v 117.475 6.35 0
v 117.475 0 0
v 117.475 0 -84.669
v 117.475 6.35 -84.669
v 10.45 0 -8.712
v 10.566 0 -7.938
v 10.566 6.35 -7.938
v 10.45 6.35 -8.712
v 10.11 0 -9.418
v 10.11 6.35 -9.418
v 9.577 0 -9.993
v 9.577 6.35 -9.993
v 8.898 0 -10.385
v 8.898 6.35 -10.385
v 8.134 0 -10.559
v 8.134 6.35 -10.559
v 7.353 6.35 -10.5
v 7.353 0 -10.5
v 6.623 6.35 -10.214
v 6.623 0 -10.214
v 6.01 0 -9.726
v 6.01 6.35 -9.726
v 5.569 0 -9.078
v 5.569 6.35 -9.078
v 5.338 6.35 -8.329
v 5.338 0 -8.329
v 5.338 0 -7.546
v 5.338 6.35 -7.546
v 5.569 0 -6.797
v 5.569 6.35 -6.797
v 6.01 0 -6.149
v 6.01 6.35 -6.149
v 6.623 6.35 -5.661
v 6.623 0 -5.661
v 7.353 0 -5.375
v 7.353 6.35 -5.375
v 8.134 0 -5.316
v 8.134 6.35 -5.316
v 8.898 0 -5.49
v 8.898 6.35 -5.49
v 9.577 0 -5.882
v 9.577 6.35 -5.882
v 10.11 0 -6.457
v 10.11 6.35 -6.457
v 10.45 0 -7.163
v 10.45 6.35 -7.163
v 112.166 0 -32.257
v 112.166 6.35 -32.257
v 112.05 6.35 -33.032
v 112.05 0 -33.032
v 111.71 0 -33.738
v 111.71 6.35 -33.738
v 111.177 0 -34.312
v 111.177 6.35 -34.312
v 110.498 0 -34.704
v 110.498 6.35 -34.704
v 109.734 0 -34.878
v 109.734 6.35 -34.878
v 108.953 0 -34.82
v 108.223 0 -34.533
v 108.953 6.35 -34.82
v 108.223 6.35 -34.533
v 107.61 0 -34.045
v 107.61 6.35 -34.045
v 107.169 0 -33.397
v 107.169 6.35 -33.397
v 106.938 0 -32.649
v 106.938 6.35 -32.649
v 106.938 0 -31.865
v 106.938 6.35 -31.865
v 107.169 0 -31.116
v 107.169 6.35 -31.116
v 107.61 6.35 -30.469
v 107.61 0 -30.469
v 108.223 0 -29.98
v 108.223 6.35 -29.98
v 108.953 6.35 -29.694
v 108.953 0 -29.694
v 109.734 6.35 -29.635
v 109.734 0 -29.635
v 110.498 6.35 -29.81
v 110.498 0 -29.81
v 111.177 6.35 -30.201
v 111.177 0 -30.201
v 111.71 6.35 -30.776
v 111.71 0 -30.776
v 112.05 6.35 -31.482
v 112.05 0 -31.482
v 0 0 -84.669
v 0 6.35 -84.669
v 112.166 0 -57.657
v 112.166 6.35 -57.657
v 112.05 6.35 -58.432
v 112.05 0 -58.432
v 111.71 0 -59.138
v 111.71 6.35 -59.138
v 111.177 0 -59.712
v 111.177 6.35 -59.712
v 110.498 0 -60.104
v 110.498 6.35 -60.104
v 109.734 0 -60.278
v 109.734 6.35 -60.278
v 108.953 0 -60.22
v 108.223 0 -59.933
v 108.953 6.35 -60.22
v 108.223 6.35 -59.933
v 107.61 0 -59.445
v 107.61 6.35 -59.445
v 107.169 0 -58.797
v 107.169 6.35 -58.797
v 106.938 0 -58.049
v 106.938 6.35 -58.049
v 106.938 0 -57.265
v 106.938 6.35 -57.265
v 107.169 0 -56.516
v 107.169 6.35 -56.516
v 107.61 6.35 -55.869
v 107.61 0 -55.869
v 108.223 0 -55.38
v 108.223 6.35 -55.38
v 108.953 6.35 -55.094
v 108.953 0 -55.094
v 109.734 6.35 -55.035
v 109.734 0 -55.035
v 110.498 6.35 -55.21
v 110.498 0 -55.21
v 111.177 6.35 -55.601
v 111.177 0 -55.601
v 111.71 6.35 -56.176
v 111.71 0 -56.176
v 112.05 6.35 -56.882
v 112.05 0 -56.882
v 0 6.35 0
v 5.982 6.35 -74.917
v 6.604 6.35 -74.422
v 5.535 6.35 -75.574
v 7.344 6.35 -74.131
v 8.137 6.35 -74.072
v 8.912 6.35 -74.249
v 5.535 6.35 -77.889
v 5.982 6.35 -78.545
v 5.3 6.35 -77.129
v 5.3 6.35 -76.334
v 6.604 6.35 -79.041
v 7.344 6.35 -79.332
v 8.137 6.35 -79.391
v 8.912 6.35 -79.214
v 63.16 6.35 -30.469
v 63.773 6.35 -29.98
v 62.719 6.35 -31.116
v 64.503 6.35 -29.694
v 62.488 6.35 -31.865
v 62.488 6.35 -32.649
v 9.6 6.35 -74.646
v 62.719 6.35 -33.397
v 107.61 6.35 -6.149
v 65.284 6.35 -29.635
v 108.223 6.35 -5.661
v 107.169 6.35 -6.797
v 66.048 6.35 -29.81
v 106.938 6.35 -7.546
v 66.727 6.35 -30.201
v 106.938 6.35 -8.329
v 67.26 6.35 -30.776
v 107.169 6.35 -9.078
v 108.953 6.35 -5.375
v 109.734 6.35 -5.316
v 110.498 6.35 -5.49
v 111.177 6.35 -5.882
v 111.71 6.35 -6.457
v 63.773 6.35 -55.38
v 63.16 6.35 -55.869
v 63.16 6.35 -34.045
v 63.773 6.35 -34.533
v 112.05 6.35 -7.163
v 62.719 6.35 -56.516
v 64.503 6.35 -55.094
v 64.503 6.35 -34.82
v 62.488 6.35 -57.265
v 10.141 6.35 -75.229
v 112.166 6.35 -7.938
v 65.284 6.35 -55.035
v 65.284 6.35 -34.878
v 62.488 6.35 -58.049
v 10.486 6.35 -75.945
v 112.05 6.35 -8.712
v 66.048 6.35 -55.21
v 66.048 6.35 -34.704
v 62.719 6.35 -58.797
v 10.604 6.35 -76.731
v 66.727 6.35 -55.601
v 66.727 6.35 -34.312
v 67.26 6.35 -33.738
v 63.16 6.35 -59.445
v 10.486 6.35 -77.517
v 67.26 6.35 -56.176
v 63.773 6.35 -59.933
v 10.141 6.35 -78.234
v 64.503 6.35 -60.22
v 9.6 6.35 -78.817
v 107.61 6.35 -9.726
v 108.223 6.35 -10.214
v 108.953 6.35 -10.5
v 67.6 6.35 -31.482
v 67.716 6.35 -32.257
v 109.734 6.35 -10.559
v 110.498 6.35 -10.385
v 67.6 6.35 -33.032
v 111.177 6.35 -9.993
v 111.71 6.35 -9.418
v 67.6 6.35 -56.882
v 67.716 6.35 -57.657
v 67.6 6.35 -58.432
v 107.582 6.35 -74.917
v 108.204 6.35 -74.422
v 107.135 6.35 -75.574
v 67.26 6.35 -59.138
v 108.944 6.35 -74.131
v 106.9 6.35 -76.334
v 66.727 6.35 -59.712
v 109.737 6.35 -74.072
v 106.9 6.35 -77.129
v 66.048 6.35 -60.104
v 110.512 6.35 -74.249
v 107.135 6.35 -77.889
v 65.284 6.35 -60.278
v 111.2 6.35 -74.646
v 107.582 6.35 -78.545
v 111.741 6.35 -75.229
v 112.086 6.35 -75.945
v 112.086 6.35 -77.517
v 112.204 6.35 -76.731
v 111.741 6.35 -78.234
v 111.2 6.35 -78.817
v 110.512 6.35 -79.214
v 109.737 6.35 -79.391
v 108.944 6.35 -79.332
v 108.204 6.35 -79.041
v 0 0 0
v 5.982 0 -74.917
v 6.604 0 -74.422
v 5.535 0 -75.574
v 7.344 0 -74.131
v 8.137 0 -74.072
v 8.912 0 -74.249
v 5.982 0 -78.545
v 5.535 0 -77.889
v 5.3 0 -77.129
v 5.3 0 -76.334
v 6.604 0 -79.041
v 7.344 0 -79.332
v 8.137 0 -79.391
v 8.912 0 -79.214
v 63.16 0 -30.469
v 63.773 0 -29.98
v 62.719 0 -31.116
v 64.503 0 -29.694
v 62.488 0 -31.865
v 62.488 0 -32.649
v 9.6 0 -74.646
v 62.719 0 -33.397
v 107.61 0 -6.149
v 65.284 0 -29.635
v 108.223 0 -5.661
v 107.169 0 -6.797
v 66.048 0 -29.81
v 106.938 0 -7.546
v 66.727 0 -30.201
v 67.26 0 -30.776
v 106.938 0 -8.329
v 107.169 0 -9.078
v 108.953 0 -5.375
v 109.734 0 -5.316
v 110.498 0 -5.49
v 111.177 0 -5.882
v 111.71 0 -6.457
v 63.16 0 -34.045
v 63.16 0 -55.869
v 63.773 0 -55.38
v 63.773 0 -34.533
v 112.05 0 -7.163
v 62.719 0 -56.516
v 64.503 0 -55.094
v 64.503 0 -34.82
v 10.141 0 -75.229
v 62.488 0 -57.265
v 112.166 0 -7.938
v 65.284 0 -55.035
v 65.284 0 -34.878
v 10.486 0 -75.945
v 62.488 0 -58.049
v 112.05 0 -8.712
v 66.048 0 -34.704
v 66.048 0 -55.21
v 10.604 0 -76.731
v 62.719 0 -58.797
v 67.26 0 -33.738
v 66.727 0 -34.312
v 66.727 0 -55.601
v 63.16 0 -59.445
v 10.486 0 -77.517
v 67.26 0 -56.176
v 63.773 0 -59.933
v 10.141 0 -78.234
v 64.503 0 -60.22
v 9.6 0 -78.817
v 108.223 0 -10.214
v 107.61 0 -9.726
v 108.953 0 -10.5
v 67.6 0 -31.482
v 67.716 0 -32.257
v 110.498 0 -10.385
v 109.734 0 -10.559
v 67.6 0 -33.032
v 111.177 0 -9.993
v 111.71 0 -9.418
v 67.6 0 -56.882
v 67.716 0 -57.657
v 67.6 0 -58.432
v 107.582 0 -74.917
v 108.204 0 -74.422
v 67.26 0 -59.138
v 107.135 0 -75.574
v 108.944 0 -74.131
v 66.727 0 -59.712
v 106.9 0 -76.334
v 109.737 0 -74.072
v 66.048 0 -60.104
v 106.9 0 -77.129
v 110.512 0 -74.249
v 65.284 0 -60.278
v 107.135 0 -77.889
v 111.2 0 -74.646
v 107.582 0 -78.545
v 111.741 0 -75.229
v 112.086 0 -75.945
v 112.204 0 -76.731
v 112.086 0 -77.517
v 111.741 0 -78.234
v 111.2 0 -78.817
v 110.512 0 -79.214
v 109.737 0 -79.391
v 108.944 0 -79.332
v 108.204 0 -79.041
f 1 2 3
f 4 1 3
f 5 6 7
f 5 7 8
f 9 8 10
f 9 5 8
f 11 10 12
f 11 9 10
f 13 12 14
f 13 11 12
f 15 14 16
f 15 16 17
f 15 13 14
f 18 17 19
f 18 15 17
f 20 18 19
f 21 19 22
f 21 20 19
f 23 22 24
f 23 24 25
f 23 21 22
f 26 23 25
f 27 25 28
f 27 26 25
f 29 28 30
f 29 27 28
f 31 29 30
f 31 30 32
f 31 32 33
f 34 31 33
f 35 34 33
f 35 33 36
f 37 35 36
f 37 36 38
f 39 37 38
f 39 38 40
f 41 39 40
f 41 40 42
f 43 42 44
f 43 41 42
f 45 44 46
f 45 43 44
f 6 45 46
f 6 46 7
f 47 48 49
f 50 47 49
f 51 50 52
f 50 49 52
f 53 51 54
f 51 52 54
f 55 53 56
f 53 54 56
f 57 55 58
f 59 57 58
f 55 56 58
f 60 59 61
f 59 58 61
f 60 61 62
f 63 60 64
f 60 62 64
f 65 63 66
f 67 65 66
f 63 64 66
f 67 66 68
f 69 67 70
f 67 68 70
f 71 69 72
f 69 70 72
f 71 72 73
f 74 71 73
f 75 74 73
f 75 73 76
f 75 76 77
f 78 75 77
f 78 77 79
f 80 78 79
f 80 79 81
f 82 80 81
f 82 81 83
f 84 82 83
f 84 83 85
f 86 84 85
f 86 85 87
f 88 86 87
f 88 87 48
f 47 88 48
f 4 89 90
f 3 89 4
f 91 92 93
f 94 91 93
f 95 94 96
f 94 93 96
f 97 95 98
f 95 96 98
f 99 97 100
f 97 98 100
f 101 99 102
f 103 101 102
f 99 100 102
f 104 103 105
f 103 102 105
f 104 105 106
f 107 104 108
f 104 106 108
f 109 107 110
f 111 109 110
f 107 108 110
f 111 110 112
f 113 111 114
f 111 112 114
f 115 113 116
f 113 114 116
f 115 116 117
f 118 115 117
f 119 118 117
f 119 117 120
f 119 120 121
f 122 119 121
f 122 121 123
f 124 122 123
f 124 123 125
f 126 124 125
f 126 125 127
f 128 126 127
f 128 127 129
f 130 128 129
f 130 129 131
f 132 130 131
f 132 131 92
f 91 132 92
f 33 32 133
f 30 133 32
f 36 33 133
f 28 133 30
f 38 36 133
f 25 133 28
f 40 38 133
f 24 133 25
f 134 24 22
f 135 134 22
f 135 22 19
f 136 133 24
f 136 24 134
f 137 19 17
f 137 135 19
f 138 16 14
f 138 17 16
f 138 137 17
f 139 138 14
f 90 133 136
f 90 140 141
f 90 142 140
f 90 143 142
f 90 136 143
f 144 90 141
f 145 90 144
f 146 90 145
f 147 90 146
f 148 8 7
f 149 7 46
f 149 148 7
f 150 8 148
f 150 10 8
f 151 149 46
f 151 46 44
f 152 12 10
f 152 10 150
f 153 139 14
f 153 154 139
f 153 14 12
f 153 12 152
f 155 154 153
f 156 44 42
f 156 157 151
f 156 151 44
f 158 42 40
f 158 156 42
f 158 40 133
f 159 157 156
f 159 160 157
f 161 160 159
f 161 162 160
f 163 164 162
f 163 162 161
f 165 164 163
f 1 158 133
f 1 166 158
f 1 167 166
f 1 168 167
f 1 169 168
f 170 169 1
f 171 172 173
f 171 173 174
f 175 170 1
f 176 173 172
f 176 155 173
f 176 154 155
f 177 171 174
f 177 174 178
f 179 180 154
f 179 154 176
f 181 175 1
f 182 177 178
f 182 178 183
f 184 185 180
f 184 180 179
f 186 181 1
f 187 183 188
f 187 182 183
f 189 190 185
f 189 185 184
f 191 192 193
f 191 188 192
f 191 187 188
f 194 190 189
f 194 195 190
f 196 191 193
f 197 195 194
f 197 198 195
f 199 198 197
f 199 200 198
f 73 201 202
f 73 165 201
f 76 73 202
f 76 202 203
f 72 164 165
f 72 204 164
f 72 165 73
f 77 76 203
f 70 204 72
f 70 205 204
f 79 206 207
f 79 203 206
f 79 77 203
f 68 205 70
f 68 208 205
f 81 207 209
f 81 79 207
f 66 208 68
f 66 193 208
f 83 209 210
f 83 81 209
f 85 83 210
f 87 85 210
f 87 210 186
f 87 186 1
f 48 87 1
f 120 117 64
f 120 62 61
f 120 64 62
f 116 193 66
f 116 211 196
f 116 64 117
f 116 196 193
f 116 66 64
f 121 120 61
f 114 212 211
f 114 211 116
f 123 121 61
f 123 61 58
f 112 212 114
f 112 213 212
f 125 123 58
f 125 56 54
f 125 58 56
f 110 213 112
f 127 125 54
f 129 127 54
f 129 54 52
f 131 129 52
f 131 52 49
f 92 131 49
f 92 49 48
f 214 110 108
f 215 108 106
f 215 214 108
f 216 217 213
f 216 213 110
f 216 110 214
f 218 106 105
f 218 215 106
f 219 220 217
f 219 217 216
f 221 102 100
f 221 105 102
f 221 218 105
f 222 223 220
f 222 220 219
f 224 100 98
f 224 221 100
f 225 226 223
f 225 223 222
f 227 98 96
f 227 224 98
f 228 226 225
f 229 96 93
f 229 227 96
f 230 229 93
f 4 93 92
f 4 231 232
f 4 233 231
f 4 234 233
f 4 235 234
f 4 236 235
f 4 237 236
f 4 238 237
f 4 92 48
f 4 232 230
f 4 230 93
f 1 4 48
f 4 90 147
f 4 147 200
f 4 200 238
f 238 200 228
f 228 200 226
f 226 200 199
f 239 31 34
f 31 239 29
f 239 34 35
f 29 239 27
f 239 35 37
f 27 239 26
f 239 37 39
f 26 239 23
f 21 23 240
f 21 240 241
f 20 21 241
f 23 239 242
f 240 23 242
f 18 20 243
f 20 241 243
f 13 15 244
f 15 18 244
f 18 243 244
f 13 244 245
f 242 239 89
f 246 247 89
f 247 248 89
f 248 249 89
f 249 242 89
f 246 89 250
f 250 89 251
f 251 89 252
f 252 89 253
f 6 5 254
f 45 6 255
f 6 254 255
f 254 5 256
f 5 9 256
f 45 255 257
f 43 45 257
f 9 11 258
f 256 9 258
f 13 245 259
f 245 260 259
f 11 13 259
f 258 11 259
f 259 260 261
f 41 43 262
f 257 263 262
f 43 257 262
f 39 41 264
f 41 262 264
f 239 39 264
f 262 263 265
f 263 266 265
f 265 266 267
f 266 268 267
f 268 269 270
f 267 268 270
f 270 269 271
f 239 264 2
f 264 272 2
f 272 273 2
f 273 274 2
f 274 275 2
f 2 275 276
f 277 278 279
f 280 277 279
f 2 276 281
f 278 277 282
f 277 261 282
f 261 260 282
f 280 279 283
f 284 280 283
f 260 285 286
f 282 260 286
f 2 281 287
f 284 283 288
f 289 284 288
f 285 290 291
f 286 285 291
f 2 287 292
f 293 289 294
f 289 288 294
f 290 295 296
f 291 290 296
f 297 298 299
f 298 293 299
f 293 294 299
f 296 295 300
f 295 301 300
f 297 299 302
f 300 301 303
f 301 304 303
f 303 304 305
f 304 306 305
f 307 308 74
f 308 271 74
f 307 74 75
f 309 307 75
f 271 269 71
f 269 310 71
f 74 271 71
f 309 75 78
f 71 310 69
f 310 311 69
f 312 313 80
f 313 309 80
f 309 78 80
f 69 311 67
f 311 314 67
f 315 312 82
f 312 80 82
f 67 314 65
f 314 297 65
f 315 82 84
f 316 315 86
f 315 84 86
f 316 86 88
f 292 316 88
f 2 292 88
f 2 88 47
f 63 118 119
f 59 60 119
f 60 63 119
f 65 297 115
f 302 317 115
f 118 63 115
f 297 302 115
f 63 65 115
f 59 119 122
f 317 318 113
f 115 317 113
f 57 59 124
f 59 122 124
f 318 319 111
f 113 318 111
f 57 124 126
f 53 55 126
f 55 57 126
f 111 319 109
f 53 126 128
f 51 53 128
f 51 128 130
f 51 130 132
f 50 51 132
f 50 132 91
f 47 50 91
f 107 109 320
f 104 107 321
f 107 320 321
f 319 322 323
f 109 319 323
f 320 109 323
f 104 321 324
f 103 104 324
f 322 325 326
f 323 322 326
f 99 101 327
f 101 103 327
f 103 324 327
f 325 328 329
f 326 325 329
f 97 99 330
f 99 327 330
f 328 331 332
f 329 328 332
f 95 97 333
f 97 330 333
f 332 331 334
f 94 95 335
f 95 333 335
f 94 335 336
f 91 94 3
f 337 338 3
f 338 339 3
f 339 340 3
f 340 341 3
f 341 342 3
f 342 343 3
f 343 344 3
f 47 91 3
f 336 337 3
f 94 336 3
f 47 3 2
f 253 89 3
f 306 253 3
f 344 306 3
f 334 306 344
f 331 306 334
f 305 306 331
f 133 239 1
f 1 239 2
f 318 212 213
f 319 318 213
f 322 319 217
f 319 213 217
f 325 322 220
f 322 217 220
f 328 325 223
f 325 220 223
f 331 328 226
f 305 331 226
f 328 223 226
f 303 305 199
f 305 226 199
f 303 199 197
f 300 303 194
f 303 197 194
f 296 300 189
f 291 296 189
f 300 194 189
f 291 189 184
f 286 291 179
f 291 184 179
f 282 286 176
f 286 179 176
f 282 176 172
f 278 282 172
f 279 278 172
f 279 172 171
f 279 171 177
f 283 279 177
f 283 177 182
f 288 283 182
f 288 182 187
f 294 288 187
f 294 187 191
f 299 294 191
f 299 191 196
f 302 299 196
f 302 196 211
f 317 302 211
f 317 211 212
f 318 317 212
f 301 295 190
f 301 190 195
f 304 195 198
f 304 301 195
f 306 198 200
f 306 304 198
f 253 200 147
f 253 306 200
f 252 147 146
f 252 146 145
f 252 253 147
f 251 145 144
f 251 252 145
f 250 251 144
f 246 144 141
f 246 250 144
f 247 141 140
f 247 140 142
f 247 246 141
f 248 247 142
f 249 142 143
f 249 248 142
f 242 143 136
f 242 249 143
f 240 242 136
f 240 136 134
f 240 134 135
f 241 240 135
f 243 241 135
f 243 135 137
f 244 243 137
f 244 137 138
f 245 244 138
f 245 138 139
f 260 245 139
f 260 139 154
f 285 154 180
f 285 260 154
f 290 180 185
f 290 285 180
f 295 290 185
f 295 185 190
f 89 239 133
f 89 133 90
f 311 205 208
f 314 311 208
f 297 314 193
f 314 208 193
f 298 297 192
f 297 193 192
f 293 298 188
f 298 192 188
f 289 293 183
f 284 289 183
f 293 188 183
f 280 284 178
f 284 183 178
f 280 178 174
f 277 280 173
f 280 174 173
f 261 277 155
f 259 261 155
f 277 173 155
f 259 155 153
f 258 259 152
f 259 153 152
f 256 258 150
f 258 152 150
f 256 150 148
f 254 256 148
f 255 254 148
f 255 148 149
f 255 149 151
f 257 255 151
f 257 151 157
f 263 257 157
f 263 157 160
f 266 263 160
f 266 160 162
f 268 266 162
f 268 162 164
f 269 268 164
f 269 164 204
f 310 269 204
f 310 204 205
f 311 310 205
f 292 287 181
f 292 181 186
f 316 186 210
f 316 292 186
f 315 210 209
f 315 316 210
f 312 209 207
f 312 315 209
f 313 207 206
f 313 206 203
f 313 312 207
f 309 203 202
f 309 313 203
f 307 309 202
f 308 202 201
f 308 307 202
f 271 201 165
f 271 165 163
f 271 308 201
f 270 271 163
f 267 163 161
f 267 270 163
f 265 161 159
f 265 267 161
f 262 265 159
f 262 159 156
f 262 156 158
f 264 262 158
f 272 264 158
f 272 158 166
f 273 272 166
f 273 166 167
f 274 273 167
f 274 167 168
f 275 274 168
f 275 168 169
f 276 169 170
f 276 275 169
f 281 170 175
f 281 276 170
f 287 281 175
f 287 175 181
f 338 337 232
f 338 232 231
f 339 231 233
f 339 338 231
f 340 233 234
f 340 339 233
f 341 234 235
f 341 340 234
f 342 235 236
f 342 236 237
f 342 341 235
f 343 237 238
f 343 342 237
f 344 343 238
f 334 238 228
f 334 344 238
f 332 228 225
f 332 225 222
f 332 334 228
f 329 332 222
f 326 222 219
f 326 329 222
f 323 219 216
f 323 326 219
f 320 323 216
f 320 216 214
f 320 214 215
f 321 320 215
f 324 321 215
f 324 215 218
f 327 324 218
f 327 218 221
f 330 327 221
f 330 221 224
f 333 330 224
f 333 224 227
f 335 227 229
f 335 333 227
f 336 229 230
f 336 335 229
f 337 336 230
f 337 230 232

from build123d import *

# Parameters (mm, degrees)
SKETCH1_W           = 117.475
SKETCH1_H           = 84.668868
SKETCH1_R           = 2.6289
SKETCH1_R_2         = 2.667
BOSS_EXTRUDE1_DEPTH = 6.35
SKETCH2_R           = 2.6289
CUT_EXTRUDE1_DEPTH  = 7.35


with BuildPart() as part:
    # Sketch1 → Boss-Extrude1 (new body)
    with BuildSketch(Plane(origin=(0, 0, 0), x_dir=(1, 0, 0), z_dir=(0, 1, 0))):
        with Locations((58.7375, 42.334434)):
            Rectangle(SKETCH1_W, SKETCH1_H)
        with Locations((7.9375, 7.9375)):
            Circle(SKETCH1_R, mode=Mode.SUBTRACT)
        with Locations((109.5375, 7.9375)):
            Circle(SKETCH1_R, mode=Mode.SUBTRACT)
        with Locations((7.9375, 76.731368)):
            Circle(SKETCH1_R_2, mode=Mode.SUBTRACT)
        with Locations((109.5375, 76.731368)):
            Circle(SKETCH1_R_2, mode=Mode.SUBTRACT)
    extrude(amount=BOSS_EXTRUDE1_DEPTH)

    # Sketch2 → Cut-Extrude1 (cut, through all)
    with BuildSketch(Plane(origin=(0, 6.35, 0), x_dir=(1, 0, 0), z_dir=(0, 1, 0))):
        with Locations((109.5375, 32.256790414)):
            Circle(SKETCH2_R)
        with Locations((109.5375, 57.656790414)):
            Circle(SKETCH2_R)
        with Locations((65.0875, 57.656790414)):
            Circle(SKETCH2_R)
        with Locations((65.0875, 32.256790414)):
            Circle(SKETCH2_R)
    extrude(amount=-CUT_EXTRUDE1_DEPTH, mode=Mode.SUBTRACT)


solid = part.part
